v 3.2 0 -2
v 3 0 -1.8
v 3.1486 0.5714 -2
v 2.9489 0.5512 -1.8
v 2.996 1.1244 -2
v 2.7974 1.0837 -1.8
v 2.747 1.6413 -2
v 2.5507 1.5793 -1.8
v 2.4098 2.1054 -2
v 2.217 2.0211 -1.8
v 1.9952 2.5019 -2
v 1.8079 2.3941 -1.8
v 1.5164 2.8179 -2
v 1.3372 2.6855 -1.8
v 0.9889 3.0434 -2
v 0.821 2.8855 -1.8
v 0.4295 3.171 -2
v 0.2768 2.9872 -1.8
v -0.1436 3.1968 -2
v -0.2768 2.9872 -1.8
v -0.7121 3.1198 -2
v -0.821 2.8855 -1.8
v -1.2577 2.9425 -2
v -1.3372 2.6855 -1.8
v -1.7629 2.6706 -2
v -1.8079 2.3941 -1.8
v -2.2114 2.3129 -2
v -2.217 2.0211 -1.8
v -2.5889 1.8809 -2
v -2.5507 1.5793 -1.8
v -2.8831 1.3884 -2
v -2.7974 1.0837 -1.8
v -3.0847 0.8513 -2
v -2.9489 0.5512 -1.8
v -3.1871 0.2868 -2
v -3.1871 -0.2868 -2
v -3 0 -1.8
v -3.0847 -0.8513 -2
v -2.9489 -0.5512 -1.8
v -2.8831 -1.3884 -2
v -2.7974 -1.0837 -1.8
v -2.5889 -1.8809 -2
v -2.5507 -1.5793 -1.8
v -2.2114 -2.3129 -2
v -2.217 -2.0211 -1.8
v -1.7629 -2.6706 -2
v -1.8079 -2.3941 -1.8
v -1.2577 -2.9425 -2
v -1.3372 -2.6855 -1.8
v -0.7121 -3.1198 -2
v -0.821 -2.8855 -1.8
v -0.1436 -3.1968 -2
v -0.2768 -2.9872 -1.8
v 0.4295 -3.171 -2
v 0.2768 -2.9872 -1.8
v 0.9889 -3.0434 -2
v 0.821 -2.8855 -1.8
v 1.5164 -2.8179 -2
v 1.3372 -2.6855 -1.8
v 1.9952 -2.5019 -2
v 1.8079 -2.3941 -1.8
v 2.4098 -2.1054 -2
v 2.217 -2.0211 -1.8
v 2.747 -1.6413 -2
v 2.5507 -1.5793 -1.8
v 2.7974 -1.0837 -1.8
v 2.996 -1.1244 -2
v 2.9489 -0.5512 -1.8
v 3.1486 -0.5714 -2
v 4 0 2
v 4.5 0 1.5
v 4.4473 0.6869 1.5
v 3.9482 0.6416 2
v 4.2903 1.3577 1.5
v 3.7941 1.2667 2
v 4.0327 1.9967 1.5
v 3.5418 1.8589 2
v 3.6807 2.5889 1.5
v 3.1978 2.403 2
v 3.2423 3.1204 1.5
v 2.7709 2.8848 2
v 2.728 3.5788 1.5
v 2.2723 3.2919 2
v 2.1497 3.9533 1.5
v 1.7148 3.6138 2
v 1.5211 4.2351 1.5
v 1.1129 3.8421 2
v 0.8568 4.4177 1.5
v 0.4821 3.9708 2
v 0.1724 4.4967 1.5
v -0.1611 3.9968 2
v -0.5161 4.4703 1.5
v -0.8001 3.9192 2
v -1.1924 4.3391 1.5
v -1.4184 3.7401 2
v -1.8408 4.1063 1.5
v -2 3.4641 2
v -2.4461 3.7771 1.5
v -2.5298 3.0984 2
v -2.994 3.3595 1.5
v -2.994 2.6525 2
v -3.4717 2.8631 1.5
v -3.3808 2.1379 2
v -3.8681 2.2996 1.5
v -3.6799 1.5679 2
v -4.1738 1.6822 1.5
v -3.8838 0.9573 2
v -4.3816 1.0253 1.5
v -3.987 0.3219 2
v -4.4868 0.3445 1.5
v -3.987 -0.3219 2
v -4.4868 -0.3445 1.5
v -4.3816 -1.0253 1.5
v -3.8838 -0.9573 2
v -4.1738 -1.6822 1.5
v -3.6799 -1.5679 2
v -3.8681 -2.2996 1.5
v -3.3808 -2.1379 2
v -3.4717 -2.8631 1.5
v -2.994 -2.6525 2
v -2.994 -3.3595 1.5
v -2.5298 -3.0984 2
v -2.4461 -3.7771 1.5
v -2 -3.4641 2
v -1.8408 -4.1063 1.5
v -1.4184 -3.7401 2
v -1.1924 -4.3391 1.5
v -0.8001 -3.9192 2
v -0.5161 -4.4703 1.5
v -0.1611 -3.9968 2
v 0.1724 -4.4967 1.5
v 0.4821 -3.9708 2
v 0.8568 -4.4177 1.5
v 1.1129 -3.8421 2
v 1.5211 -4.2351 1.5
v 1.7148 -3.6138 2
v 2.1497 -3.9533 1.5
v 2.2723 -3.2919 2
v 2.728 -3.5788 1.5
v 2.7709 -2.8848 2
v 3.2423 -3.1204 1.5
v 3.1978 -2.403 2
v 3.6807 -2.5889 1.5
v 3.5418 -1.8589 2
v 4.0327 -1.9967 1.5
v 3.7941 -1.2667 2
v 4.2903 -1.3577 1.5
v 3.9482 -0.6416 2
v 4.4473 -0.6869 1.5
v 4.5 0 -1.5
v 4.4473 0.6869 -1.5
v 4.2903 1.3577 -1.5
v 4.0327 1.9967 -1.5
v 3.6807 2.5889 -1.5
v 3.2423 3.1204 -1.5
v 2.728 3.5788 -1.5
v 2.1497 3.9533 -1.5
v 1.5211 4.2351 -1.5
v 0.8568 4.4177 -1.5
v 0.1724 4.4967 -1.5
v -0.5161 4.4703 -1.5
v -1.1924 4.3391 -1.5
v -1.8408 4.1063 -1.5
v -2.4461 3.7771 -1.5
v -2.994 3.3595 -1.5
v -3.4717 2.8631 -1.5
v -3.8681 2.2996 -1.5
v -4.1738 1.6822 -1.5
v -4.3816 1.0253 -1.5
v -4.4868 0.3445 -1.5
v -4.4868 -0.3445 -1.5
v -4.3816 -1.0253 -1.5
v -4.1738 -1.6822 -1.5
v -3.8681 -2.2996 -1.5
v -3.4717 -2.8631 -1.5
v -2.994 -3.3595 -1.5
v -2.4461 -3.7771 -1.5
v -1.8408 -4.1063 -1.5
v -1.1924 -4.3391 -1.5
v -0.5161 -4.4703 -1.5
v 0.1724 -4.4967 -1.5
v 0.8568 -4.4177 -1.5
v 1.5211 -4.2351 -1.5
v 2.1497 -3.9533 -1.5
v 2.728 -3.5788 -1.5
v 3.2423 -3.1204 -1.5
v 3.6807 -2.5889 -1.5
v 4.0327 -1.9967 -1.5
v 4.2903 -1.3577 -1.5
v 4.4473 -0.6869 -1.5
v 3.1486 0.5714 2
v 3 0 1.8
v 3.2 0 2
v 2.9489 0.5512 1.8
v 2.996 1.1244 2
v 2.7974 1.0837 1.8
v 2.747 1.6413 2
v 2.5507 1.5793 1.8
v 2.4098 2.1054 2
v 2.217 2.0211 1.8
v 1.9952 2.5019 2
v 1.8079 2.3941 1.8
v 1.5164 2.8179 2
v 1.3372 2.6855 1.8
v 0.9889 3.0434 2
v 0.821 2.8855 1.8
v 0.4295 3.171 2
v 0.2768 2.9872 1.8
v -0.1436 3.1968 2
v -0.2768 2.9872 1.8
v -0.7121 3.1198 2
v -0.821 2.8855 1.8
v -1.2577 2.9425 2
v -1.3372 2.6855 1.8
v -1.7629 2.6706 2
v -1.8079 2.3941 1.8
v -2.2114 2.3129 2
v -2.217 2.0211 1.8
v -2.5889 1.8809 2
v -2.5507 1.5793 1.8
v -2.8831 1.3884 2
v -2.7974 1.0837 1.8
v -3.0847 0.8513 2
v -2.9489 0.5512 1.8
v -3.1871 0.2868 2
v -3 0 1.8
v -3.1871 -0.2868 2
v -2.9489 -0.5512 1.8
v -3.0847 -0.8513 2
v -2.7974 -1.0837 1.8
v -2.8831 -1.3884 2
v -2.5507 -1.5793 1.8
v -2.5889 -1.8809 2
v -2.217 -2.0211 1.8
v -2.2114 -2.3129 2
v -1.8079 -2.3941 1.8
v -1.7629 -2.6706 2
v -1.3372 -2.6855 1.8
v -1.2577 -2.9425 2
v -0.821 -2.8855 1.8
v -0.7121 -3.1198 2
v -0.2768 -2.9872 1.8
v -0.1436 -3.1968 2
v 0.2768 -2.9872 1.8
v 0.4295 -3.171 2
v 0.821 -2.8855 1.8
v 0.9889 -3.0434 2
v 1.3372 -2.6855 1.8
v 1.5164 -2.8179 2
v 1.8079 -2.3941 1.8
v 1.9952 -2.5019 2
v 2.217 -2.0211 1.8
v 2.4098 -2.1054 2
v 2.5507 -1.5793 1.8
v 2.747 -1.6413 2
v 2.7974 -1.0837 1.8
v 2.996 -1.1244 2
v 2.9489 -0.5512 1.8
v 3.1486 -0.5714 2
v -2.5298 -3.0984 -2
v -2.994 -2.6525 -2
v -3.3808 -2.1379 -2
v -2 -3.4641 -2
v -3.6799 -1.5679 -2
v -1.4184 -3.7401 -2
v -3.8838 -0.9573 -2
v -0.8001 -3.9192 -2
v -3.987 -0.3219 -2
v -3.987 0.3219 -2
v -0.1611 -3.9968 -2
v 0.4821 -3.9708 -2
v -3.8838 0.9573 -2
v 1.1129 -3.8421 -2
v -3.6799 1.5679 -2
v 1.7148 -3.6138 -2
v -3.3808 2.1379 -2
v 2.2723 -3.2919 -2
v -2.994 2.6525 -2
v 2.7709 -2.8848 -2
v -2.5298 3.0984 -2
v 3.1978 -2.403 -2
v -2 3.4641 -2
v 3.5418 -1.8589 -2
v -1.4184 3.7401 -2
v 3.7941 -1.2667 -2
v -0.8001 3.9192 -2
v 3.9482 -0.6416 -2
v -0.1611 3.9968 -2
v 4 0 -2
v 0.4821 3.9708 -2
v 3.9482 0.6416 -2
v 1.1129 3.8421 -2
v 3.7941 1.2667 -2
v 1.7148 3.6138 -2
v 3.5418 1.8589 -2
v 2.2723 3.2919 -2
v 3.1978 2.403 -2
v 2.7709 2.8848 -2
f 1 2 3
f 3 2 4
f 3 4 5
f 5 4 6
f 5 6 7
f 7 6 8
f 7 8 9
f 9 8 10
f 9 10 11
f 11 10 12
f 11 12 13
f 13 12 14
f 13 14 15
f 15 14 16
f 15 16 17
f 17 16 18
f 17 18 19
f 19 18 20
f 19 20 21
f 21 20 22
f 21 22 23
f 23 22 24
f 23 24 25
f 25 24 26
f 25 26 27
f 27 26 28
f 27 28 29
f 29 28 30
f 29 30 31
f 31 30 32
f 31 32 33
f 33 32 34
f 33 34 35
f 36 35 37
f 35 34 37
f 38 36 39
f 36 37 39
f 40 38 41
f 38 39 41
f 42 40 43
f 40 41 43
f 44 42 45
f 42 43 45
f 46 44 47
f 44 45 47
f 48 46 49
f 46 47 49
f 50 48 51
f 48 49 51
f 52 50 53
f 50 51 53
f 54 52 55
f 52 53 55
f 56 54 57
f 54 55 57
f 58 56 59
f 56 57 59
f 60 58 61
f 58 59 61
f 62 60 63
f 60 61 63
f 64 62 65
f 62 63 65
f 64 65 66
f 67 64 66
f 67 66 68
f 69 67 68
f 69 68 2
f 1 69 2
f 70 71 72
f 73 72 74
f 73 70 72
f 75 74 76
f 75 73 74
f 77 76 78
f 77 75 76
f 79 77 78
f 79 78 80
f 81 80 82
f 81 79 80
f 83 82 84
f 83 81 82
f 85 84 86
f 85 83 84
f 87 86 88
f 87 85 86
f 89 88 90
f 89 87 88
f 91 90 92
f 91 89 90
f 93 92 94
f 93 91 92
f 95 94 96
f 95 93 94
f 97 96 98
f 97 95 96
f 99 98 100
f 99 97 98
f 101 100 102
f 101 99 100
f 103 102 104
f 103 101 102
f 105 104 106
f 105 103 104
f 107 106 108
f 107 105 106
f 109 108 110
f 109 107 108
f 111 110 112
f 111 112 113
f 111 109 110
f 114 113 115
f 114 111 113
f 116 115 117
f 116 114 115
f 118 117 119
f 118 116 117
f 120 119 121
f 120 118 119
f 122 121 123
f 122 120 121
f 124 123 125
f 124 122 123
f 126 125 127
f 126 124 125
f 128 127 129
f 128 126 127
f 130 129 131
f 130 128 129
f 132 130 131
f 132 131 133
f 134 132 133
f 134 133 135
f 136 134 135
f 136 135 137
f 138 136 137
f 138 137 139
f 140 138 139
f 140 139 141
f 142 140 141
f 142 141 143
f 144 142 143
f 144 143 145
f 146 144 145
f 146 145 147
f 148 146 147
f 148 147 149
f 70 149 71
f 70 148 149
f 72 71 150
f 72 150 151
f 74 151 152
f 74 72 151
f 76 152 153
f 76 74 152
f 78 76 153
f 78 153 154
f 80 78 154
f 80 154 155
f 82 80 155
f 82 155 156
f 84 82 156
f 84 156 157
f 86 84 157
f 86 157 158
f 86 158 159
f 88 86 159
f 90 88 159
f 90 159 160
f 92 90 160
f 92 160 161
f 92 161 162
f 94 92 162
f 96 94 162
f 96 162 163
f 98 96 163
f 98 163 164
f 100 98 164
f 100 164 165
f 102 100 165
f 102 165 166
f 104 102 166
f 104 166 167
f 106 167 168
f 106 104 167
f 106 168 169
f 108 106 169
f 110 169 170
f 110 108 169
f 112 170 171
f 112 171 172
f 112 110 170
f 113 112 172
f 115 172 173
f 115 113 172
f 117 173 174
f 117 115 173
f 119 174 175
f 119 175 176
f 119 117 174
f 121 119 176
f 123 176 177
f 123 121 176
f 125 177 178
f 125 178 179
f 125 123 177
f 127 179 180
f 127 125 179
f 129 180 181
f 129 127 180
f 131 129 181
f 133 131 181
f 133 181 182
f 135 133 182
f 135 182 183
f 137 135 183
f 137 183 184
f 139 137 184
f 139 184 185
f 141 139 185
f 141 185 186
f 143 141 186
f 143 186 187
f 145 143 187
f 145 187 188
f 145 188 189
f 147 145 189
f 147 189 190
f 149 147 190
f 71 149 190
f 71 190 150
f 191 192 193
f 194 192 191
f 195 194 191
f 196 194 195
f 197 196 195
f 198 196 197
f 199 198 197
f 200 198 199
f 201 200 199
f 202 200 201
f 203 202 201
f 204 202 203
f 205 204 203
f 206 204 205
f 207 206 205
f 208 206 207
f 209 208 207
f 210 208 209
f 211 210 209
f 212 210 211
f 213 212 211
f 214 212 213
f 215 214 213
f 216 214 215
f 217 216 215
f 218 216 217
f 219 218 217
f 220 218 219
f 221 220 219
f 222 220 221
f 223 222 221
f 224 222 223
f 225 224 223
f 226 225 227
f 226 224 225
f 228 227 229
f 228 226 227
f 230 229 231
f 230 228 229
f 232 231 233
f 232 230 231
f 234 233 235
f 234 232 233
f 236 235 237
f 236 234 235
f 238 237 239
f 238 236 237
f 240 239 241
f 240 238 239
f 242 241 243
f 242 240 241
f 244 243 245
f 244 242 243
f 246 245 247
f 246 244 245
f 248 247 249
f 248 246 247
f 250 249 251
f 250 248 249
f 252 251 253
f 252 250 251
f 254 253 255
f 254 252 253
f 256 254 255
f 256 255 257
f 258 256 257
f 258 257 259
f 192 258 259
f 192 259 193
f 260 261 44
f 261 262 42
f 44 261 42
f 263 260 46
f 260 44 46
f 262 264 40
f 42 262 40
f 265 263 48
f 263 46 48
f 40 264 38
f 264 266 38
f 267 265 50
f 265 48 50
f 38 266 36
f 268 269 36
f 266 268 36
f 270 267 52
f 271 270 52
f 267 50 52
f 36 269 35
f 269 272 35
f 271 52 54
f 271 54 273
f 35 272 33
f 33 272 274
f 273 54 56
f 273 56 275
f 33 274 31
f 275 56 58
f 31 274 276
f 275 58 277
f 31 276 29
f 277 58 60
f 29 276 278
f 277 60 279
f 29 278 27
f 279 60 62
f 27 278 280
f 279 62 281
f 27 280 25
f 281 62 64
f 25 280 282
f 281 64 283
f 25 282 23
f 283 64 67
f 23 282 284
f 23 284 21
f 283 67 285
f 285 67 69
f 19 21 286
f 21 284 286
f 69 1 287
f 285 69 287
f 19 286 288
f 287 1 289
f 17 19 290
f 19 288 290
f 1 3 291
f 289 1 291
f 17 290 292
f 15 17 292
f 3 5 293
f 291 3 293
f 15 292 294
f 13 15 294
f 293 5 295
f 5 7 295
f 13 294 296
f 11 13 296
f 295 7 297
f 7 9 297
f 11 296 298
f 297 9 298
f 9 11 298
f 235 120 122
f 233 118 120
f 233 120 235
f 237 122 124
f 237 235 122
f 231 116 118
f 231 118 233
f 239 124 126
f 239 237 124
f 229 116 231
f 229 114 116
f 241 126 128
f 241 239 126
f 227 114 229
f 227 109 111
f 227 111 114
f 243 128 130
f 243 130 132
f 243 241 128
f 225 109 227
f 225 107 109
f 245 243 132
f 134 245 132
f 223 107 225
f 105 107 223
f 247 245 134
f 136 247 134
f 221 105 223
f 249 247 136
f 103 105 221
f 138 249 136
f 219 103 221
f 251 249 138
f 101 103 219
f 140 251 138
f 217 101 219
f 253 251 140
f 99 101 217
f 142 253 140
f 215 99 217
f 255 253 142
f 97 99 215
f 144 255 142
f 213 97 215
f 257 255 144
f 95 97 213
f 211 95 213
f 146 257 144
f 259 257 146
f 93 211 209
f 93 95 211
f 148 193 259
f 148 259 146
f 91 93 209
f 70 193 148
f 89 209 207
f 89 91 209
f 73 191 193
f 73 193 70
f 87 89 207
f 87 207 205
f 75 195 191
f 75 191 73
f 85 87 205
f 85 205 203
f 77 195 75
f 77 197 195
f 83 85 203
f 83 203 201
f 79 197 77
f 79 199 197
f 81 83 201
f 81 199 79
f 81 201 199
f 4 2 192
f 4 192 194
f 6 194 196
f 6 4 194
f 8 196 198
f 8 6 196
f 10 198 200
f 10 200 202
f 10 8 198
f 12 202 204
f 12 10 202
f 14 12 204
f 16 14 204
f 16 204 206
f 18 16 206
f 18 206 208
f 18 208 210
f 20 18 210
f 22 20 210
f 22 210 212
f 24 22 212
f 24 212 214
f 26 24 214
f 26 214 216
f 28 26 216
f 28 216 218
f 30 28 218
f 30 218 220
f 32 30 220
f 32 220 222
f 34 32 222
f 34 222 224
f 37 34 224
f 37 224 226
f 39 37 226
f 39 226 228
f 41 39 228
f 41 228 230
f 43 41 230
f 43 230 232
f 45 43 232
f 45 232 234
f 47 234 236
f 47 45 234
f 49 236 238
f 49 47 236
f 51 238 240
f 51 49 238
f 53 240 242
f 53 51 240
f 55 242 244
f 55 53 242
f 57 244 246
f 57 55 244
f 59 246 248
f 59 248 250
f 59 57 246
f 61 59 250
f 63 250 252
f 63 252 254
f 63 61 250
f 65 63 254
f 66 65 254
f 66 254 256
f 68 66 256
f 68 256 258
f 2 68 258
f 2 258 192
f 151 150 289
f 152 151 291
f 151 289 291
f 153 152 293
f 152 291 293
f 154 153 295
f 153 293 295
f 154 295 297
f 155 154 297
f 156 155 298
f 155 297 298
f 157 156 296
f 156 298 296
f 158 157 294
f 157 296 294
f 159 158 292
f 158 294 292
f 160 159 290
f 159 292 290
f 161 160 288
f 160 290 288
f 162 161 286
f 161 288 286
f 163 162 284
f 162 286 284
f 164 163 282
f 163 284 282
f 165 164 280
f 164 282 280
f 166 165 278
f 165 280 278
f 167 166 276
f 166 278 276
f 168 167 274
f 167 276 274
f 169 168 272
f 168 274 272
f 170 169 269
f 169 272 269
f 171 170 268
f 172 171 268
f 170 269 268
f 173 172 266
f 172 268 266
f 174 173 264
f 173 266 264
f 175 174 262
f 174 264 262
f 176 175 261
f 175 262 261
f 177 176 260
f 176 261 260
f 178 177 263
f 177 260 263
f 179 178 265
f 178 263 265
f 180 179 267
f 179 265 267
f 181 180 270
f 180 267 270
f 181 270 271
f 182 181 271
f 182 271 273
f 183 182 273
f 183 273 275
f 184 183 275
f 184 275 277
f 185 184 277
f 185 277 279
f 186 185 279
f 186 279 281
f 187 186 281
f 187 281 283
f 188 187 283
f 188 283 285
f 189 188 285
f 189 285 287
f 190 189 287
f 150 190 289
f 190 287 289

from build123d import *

# Parameters (mm, degrees)
ESQUISSE1_R          = 4.5
ESQUISSE1_R_2        = 3
BASE_EXTRUSION_DEPTH = 2
CHANFREIN1_SIZE      = 0.5
CHANFREIN2_SIZE      = 0.2


with BuildPart() as part:
    # Esquisse1 → Base-Extrusion (new, symmetric)
    with BuildSketch(Plane.XY):
        Circle(ESQUISSE1_R)
        Circle(ESQUISSE1_R_2, mode=Mode.SUBTRACT)
    extrude(amount=BASE_EXTRUSION_DEPTH, both=True)

    # Chanfrein1
    chanfrein1_edges = [part.edges().sort_by_distance(p)[0] for p in [
        (-4.5, 0, -2),
        (-4.5, 0, 2),
    ]]
    chamfer(chanfrein1_edges, length=CHANFREIN1_SIZE)

    # Chanfrein2
    chanfrein2_edges = [part.edges().sort_by_distance(p)[0] for p in [
        (-3, 0, -2),
        (-3, 0, 2),
    ]]
    chamfer(chanfrein2_edges, length=CHANFREIN2_SIZE)


solid = part.part
